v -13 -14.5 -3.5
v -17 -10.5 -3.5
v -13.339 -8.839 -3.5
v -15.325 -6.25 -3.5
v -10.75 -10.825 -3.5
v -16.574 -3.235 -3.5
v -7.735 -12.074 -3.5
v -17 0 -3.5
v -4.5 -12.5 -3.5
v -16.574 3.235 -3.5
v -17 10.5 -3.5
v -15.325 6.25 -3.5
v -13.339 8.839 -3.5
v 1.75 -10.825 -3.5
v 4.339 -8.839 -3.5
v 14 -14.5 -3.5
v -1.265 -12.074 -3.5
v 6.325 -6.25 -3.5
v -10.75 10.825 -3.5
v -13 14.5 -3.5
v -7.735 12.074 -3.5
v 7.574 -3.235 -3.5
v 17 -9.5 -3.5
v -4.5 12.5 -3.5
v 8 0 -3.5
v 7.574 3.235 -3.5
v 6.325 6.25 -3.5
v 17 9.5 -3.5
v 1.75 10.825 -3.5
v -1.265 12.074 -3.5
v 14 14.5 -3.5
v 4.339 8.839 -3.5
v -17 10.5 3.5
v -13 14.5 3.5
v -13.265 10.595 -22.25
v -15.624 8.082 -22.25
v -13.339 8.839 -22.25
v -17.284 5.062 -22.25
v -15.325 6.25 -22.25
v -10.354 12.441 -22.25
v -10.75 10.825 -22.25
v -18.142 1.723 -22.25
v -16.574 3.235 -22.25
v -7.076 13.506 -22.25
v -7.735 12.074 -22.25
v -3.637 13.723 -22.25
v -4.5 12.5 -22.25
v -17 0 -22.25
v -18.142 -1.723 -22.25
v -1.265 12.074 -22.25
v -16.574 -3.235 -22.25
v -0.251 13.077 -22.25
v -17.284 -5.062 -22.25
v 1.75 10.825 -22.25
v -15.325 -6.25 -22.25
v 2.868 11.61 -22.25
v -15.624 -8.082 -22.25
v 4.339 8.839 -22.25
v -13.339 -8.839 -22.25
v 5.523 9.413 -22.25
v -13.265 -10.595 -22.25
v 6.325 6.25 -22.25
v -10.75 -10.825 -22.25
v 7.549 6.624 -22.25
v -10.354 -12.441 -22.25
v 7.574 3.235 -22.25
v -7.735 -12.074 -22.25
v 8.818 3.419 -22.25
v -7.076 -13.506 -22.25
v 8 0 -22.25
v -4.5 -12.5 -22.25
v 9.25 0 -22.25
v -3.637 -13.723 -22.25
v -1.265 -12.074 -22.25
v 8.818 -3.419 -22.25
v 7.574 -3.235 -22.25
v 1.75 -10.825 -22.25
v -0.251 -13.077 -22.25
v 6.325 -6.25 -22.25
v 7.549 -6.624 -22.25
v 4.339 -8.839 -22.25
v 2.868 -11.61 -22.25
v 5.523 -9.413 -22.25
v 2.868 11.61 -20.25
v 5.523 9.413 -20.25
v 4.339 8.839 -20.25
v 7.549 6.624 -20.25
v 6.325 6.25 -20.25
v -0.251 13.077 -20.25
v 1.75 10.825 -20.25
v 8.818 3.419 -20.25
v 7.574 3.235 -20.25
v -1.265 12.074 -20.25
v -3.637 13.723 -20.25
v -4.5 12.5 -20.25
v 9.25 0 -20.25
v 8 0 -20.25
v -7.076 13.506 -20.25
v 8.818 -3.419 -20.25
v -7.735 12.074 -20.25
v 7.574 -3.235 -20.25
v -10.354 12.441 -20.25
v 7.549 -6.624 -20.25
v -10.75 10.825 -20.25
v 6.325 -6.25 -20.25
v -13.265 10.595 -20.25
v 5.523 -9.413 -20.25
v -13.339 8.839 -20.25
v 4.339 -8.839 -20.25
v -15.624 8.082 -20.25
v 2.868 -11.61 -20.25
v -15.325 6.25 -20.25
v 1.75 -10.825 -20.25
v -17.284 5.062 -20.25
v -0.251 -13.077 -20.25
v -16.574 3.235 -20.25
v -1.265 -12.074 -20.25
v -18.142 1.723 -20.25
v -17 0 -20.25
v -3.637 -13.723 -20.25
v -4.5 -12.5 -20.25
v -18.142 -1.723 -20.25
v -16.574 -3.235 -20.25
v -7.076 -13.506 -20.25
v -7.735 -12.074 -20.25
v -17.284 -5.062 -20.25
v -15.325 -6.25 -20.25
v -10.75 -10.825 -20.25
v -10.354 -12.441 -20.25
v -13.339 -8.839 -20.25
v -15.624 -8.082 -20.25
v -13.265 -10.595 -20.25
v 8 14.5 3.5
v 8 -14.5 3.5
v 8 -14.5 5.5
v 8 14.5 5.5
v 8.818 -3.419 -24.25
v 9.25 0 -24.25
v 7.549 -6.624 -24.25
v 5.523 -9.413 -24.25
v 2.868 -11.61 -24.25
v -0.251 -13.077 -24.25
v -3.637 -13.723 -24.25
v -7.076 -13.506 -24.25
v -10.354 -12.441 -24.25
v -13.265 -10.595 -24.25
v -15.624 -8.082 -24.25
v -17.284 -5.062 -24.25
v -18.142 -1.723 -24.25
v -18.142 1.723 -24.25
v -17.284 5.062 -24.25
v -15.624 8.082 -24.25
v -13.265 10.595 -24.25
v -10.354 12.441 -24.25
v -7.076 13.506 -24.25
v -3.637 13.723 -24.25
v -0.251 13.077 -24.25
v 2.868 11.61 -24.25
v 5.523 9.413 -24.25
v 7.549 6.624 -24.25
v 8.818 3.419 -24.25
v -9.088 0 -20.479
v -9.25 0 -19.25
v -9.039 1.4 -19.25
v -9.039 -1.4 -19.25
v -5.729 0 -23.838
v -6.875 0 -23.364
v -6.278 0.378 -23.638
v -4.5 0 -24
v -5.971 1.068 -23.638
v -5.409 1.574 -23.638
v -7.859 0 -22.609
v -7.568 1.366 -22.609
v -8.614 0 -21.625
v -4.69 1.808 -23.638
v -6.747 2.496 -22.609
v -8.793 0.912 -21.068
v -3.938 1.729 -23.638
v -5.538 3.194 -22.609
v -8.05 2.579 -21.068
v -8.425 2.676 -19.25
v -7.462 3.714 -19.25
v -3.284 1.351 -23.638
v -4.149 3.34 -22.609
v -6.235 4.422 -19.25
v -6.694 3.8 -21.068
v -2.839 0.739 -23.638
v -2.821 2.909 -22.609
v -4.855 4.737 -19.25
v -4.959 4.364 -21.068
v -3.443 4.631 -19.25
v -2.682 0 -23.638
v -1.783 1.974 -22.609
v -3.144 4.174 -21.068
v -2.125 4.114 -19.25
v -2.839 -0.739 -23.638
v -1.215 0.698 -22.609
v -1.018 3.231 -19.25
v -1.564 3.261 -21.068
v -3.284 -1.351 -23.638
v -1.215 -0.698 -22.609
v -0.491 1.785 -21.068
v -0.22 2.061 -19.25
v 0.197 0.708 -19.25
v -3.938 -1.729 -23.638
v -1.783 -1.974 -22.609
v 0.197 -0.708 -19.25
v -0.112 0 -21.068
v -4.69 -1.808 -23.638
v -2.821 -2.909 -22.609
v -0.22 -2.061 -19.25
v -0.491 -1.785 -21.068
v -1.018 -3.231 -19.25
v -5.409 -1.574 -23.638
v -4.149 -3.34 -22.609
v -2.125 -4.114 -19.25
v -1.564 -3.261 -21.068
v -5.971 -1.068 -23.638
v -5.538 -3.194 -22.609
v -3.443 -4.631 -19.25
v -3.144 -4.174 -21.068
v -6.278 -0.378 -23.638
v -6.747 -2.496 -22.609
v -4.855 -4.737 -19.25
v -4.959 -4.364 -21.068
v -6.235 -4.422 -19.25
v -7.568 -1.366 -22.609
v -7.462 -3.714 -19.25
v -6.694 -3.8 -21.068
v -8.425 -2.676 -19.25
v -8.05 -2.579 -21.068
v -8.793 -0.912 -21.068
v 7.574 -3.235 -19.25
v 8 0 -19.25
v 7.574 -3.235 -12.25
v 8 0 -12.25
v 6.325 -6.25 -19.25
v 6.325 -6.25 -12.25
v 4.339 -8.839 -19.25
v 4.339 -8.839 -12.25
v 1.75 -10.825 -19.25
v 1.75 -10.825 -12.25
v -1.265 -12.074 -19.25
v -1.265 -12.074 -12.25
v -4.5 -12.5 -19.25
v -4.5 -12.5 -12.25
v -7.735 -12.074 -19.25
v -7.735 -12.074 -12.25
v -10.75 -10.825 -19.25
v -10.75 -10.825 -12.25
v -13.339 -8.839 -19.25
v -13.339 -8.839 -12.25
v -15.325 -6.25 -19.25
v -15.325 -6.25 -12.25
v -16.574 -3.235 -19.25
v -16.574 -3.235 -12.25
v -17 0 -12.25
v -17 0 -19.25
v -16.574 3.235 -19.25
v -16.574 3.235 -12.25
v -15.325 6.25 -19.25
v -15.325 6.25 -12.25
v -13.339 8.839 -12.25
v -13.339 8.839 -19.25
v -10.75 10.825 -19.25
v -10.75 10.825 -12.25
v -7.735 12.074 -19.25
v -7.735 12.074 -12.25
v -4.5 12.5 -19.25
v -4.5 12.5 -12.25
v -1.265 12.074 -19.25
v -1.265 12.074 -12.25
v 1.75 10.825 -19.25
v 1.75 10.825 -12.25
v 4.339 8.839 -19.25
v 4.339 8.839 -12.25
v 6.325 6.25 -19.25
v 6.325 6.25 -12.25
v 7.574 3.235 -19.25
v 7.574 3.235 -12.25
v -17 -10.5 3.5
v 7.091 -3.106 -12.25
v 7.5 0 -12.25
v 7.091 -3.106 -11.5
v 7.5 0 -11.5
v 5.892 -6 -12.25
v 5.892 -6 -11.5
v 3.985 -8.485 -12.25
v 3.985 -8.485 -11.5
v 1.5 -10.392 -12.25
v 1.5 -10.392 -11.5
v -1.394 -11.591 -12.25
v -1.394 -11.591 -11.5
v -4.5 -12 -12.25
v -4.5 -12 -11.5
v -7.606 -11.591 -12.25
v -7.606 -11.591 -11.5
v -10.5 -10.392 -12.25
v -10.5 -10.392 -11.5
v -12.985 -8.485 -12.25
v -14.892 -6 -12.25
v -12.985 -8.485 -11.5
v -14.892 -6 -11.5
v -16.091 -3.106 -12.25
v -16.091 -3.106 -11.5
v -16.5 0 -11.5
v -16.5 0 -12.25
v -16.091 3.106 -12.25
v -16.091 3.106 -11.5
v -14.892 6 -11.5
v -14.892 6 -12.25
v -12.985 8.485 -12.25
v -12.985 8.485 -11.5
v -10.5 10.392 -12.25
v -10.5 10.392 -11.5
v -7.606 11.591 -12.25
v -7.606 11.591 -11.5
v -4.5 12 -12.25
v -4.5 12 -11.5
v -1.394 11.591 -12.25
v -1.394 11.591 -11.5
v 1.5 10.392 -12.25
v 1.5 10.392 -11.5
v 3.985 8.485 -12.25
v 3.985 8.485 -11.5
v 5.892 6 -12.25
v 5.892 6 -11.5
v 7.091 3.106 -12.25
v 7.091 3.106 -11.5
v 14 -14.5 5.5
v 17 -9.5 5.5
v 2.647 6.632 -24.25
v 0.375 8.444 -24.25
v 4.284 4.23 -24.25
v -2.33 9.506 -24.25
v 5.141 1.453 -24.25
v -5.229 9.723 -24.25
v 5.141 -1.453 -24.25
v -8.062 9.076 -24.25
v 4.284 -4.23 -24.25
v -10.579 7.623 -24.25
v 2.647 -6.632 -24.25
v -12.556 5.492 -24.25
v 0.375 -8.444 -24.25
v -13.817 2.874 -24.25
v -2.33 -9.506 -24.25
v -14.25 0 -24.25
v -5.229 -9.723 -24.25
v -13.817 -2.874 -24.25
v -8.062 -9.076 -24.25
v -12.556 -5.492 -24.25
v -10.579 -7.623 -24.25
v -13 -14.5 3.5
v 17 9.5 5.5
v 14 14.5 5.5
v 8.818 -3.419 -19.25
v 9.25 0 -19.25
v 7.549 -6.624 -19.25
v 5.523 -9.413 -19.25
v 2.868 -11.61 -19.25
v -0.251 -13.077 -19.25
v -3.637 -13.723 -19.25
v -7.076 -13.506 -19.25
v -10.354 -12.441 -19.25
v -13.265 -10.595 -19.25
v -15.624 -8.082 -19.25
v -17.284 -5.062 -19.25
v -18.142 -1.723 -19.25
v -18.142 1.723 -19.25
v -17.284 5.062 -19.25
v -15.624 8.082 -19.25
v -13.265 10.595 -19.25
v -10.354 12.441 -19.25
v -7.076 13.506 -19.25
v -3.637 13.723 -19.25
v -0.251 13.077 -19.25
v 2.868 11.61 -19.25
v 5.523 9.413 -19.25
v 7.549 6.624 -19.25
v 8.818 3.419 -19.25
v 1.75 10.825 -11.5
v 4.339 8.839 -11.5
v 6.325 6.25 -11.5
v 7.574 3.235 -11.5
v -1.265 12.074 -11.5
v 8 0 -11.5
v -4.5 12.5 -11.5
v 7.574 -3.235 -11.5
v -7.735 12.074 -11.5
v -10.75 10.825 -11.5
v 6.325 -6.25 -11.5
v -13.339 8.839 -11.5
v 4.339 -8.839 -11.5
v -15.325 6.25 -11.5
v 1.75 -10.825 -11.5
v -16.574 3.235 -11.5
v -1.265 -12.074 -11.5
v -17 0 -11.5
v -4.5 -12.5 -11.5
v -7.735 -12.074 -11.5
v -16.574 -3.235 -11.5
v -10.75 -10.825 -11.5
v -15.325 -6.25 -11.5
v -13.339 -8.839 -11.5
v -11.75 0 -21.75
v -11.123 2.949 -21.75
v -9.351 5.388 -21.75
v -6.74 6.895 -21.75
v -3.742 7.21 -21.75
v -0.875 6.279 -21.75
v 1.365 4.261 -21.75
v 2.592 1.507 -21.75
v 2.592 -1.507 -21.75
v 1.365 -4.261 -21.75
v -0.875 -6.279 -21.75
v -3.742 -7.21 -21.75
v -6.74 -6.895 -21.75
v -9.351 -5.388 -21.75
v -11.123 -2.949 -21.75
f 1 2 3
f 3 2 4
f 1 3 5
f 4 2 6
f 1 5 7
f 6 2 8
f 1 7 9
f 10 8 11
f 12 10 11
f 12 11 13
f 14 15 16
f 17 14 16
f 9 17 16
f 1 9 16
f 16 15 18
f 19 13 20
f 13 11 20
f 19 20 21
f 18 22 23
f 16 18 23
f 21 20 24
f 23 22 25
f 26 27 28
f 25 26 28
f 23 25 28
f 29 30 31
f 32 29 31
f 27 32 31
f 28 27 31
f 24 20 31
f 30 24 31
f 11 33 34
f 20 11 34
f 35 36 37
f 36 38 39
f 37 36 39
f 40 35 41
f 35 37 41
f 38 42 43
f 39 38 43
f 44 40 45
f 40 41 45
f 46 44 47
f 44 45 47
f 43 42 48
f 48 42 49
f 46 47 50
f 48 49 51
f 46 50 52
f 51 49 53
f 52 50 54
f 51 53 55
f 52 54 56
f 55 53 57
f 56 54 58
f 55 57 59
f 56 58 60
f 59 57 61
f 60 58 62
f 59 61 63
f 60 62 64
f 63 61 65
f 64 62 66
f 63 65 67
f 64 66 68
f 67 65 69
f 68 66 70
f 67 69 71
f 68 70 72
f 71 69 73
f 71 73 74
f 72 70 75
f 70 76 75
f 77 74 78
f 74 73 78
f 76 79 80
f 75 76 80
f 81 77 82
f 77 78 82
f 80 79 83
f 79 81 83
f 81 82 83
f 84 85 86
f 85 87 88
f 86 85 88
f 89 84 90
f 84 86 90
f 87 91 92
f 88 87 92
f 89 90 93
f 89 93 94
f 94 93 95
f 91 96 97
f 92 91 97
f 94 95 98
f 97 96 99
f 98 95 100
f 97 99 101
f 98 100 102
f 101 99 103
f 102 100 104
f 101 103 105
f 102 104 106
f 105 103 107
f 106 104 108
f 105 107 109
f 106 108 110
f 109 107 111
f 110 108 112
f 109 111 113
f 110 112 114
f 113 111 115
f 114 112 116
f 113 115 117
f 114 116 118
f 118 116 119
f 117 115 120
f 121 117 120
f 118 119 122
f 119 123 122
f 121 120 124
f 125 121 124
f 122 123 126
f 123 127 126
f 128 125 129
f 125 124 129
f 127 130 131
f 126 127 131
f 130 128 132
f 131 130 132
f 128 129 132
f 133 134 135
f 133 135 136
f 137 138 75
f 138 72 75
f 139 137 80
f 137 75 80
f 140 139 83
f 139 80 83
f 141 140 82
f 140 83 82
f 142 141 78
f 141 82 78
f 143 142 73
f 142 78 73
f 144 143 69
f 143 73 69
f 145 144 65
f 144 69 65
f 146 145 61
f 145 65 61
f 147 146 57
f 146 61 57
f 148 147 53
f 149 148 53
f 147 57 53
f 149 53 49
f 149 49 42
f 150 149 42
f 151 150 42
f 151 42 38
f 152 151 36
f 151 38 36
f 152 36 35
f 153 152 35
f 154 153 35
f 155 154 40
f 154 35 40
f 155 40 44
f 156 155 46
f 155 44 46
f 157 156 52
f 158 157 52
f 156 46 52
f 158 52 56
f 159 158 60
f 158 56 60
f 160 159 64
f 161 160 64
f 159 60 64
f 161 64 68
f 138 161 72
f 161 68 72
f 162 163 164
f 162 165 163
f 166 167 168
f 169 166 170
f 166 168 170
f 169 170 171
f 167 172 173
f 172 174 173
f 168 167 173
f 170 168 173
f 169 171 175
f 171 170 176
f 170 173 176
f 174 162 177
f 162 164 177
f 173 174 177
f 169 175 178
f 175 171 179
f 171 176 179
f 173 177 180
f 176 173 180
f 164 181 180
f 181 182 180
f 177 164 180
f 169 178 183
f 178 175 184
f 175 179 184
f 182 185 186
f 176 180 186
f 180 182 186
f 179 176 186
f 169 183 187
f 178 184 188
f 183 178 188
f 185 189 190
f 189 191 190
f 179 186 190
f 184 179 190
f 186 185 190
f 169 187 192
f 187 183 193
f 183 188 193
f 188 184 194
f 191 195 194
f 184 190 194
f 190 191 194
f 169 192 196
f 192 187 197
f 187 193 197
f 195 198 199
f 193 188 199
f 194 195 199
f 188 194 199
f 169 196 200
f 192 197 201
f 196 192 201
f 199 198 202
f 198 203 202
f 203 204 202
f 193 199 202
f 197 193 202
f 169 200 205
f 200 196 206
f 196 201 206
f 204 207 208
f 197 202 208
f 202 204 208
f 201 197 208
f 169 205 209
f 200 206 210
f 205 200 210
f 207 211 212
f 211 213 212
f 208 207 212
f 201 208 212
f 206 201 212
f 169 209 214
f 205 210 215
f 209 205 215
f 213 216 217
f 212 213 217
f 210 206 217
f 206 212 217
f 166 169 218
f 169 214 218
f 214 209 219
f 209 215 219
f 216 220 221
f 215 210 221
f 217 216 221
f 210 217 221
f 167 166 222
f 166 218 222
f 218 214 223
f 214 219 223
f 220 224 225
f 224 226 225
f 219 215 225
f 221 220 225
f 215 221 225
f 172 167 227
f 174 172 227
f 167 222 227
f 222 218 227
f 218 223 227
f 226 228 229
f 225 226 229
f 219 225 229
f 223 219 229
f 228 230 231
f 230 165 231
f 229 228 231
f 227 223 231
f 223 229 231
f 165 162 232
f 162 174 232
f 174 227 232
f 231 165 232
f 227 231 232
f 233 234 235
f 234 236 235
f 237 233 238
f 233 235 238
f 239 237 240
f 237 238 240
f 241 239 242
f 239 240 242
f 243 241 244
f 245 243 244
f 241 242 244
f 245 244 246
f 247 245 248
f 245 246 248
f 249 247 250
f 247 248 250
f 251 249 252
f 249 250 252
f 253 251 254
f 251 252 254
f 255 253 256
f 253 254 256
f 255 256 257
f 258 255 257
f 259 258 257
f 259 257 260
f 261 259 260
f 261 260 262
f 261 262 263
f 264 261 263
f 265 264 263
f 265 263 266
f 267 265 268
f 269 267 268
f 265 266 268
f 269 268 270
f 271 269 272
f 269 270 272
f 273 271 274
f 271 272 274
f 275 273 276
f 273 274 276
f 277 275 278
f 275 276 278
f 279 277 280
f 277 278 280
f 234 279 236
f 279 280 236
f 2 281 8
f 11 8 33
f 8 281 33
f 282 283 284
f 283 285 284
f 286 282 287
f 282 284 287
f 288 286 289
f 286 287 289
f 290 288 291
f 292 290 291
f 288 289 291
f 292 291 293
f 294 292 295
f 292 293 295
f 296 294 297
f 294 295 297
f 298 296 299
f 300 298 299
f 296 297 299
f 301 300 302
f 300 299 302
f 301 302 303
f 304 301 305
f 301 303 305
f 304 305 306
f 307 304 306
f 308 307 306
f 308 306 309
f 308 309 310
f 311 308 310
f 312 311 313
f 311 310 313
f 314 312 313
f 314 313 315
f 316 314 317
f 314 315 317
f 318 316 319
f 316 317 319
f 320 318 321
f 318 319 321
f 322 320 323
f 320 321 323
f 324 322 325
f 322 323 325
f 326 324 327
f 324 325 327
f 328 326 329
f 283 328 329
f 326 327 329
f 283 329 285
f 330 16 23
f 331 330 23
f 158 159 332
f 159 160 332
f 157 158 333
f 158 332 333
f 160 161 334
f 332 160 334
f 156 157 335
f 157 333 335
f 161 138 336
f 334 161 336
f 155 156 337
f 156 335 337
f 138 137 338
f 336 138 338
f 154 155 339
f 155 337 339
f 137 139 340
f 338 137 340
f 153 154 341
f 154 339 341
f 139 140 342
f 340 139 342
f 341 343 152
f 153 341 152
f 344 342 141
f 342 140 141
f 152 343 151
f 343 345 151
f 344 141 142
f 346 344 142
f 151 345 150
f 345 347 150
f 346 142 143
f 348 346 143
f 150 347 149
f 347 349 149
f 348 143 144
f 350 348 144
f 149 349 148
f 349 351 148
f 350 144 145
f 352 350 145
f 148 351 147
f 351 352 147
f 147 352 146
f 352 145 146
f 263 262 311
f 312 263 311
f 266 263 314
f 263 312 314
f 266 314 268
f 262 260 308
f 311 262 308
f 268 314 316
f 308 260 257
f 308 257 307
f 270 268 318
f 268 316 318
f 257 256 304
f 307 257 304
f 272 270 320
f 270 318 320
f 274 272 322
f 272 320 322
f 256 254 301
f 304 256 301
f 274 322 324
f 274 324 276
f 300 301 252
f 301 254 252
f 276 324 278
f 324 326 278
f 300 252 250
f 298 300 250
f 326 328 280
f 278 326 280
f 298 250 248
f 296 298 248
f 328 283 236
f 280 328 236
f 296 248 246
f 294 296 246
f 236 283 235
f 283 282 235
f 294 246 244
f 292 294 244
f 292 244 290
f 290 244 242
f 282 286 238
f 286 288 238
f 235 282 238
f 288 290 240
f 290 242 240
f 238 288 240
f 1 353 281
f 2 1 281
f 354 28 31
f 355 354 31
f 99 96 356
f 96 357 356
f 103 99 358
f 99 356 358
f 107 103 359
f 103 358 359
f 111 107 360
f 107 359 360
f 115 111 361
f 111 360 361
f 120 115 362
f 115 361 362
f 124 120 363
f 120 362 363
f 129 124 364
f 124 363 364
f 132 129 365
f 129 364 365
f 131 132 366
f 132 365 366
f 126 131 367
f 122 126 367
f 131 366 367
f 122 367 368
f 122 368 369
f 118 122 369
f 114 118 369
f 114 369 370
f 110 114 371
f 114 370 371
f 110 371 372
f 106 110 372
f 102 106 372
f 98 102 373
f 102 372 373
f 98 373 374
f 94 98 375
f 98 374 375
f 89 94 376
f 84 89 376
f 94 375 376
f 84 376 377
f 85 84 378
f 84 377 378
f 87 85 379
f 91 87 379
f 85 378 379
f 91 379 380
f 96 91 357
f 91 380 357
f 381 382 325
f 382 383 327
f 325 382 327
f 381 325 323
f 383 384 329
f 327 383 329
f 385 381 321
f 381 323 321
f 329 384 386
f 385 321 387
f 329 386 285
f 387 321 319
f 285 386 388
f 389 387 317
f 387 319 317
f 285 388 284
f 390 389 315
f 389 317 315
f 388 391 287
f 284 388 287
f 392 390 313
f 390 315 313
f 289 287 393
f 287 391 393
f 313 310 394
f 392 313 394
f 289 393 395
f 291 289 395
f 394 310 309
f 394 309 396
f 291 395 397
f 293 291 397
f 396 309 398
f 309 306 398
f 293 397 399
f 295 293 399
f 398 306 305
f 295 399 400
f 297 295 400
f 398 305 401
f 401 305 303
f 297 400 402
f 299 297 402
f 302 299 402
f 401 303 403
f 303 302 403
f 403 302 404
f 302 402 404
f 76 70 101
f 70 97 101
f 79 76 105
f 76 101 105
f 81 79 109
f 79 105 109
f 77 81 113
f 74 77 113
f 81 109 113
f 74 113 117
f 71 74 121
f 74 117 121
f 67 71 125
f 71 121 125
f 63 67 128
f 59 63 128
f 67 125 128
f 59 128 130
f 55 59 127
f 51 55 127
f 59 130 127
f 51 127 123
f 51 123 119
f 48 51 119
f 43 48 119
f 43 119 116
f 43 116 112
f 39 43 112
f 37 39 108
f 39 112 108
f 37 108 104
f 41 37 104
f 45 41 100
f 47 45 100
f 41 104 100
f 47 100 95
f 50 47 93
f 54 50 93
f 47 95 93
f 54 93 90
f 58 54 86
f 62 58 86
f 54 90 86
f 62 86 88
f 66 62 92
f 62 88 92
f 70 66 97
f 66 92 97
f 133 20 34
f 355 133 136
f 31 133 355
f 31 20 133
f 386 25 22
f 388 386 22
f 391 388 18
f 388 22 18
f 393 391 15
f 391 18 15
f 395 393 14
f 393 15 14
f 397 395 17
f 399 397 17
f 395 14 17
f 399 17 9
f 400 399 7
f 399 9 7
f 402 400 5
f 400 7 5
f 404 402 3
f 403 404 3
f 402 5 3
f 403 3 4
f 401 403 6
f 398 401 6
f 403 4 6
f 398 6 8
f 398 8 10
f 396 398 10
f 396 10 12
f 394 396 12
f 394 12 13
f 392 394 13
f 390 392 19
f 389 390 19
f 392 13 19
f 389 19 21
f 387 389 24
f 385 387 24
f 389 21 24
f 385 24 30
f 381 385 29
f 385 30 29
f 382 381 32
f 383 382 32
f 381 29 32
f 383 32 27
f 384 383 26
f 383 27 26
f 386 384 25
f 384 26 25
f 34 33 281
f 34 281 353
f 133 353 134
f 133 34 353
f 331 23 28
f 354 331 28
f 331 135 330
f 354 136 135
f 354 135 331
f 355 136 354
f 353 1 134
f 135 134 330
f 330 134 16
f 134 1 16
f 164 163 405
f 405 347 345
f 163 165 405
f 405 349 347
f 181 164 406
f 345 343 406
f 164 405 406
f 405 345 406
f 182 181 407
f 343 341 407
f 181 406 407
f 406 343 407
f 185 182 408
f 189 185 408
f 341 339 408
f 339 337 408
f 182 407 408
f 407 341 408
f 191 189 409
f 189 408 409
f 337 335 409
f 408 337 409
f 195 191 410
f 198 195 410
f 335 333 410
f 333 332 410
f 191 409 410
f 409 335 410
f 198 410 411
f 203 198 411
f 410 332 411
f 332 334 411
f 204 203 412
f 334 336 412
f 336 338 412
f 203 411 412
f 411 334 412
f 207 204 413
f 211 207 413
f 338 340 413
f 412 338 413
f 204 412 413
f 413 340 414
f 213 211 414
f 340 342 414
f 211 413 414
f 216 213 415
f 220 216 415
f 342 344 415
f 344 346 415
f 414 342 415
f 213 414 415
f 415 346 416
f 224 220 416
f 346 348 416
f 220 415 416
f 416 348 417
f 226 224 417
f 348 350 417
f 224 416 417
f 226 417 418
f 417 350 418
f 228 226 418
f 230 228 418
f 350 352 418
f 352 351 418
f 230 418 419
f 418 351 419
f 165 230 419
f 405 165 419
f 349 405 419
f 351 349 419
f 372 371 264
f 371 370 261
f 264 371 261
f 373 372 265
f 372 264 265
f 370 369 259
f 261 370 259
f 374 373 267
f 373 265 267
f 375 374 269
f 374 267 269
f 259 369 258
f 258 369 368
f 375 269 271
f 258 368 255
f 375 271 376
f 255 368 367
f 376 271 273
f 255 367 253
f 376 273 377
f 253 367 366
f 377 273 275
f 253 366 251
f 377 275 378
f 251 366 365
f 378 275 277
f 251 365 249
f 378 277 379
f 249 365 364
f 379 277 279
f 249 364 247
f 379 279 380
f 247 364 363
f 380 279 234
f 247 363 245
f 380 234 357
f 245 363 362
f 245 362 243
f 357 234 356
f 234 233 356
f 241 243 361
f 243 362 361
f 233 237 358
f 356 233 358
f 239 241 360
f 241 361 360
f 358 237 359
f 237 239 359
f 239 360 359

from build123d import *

# Parameters (mm, degrees)
SKETCH1_W           = 34
SKETCH1_H           = 29
BOSS_EXTRUDE1_DEPTH = 3.5
SKETCH2_W           = 9
SKETCH2_H           = 29
BOSS_EXTRUDE2_DEPTH = 2
CUT_EXTRUDE1_DEPTH  = 25.088378941
SKETCH5_R           = 9.75
CUT_EXTRUDE2_DEPTH  = 5
CUT_EXTRUDE2_DRAFT  = -45


with BuildPart() as part:
    # Sketch1 → Boss-Extrude1 (new, symmetric)
    with BuildSketch(Plane.XY):
        Rectangle(SKETCH1_W, SKETCH1_H)
    extrude(amount=BOSS_EXTRUDE1_DEPTH, both=True)

    # Sketch2 → Boss-Extrude2 (add)
    with BuildSketch(Plane.XY.offset(3.5)):
        with Locations((12.5, 0)):
            Rectangle(SKETCH2_W, SKETCH2_H)
    extrude(amount=BOSS_EXTRUDE2_DEPTH)

    # Sketch3 → Cut-Extrude1 (cut, through all)
    with BuildSketch(Plane(origin=(0, 0, -3.5), x_dir=(-1, 0, 0), z_dir=(0, 0, -1))):
        Polygon((-14, -14.5), (-17, -9.5), (-17, -14.5), align=None)
        Polygon((13, -14.5), (17, -10.5), (17, -14.5), align=None)
        Polygon((17, 10.5), (13, 14.5), (17, 14.5), align=None)
        Polygon((-17, 9.5), (-14, 14.5), (-17, 14.5), align=None)
    extrude(amount=-CUT_EXTRUDE1_DEPTH, mode=Mode.SUBTRACT)

    # Sketch4 → Revolve1 (revolve)
    with BuildSketch(Plane(origin=(0, 0, 0), x_dir=(1, 0, 0), z_dir=(0, 1, 0)), mode=Mode.PRIVATE) as revolve1_sk:
        Polygon((-17, 3.5), (-4.5, 3.5), (-4.5, 24.25), (-18.25, 24.25), (-18.25, 22.25), (-17, 22.25), (-17, 20.25), (-18.25, 20.25), (-18.25, 19.25), (-17, 19.25), (-17, 12.25), (-16.5, 12.25), (-16.5, 11.5), (-17, 11.5), align=None)
    revolve(revolve1_sk.sketch.rotate(Axis((-4.5, 0, -3.5), (0, 0, -1)), 180), axis=Axis((-4.5, 0, -3.5), (0, 0, -1)))


with BuildPart() as cut_extrude2_tool:
    # Sketch5 → Cut-Extrude2 (with draft: the straight prism first)
    with BuildSketch(Plane(origin=(0, 0, -24.25), x_dir=(-1, 0, 0), z_dir=(0, 0, -1))):
        with Locations((4.5, 0)):
            Circle(SKETCH5_R)
    extrude(amount=-CUT_EXTRUDE2_DEPTH)
    # Cut-Extrude2: the draft: its side faces are tilted about the plane it starts from
    cut_extrude2_sides = [cut_extrude2_tool.faces().sort_by_distance(p)[0] for p in [
        (5.25, 0, -21.75),
    ]]
    draft(cut_extrude2_sides, Plane(origin=(0, 0, -24.25), x_dir=(-1, 0, 0), z_dir=(0, 0, -1)), CUT_EXTRUDE2_DRAFT)


with BuildPart() as part_1:
    add(part.part)

    # Cut-Extrude2: cut by cut_extrude2_tool
    add(cut_extrude2_tool.part, mode=Mode.SUBTRACT)

    # Sketch6 → Revolve2 (revolve)
    with BuildSketch(Plane(origin=(0, 0, 0), x_dir=(1, 0, 0), z_dir=(0, 1, 0))):
        with BuildLine():
            Line((-9.25, 19.25), (-4.5, 19.25))
            Line((-4.5, 19.25), (-4.5, 24))
            ThreePointArc((-4.5, 24), (-7.858757211, 22.608757211), (-9.25, 19.25))
        make_face()
    revolve(axis=Axis((-4.5, 0, -19.25), (0, 0, -1)))


solid = part_1.part
